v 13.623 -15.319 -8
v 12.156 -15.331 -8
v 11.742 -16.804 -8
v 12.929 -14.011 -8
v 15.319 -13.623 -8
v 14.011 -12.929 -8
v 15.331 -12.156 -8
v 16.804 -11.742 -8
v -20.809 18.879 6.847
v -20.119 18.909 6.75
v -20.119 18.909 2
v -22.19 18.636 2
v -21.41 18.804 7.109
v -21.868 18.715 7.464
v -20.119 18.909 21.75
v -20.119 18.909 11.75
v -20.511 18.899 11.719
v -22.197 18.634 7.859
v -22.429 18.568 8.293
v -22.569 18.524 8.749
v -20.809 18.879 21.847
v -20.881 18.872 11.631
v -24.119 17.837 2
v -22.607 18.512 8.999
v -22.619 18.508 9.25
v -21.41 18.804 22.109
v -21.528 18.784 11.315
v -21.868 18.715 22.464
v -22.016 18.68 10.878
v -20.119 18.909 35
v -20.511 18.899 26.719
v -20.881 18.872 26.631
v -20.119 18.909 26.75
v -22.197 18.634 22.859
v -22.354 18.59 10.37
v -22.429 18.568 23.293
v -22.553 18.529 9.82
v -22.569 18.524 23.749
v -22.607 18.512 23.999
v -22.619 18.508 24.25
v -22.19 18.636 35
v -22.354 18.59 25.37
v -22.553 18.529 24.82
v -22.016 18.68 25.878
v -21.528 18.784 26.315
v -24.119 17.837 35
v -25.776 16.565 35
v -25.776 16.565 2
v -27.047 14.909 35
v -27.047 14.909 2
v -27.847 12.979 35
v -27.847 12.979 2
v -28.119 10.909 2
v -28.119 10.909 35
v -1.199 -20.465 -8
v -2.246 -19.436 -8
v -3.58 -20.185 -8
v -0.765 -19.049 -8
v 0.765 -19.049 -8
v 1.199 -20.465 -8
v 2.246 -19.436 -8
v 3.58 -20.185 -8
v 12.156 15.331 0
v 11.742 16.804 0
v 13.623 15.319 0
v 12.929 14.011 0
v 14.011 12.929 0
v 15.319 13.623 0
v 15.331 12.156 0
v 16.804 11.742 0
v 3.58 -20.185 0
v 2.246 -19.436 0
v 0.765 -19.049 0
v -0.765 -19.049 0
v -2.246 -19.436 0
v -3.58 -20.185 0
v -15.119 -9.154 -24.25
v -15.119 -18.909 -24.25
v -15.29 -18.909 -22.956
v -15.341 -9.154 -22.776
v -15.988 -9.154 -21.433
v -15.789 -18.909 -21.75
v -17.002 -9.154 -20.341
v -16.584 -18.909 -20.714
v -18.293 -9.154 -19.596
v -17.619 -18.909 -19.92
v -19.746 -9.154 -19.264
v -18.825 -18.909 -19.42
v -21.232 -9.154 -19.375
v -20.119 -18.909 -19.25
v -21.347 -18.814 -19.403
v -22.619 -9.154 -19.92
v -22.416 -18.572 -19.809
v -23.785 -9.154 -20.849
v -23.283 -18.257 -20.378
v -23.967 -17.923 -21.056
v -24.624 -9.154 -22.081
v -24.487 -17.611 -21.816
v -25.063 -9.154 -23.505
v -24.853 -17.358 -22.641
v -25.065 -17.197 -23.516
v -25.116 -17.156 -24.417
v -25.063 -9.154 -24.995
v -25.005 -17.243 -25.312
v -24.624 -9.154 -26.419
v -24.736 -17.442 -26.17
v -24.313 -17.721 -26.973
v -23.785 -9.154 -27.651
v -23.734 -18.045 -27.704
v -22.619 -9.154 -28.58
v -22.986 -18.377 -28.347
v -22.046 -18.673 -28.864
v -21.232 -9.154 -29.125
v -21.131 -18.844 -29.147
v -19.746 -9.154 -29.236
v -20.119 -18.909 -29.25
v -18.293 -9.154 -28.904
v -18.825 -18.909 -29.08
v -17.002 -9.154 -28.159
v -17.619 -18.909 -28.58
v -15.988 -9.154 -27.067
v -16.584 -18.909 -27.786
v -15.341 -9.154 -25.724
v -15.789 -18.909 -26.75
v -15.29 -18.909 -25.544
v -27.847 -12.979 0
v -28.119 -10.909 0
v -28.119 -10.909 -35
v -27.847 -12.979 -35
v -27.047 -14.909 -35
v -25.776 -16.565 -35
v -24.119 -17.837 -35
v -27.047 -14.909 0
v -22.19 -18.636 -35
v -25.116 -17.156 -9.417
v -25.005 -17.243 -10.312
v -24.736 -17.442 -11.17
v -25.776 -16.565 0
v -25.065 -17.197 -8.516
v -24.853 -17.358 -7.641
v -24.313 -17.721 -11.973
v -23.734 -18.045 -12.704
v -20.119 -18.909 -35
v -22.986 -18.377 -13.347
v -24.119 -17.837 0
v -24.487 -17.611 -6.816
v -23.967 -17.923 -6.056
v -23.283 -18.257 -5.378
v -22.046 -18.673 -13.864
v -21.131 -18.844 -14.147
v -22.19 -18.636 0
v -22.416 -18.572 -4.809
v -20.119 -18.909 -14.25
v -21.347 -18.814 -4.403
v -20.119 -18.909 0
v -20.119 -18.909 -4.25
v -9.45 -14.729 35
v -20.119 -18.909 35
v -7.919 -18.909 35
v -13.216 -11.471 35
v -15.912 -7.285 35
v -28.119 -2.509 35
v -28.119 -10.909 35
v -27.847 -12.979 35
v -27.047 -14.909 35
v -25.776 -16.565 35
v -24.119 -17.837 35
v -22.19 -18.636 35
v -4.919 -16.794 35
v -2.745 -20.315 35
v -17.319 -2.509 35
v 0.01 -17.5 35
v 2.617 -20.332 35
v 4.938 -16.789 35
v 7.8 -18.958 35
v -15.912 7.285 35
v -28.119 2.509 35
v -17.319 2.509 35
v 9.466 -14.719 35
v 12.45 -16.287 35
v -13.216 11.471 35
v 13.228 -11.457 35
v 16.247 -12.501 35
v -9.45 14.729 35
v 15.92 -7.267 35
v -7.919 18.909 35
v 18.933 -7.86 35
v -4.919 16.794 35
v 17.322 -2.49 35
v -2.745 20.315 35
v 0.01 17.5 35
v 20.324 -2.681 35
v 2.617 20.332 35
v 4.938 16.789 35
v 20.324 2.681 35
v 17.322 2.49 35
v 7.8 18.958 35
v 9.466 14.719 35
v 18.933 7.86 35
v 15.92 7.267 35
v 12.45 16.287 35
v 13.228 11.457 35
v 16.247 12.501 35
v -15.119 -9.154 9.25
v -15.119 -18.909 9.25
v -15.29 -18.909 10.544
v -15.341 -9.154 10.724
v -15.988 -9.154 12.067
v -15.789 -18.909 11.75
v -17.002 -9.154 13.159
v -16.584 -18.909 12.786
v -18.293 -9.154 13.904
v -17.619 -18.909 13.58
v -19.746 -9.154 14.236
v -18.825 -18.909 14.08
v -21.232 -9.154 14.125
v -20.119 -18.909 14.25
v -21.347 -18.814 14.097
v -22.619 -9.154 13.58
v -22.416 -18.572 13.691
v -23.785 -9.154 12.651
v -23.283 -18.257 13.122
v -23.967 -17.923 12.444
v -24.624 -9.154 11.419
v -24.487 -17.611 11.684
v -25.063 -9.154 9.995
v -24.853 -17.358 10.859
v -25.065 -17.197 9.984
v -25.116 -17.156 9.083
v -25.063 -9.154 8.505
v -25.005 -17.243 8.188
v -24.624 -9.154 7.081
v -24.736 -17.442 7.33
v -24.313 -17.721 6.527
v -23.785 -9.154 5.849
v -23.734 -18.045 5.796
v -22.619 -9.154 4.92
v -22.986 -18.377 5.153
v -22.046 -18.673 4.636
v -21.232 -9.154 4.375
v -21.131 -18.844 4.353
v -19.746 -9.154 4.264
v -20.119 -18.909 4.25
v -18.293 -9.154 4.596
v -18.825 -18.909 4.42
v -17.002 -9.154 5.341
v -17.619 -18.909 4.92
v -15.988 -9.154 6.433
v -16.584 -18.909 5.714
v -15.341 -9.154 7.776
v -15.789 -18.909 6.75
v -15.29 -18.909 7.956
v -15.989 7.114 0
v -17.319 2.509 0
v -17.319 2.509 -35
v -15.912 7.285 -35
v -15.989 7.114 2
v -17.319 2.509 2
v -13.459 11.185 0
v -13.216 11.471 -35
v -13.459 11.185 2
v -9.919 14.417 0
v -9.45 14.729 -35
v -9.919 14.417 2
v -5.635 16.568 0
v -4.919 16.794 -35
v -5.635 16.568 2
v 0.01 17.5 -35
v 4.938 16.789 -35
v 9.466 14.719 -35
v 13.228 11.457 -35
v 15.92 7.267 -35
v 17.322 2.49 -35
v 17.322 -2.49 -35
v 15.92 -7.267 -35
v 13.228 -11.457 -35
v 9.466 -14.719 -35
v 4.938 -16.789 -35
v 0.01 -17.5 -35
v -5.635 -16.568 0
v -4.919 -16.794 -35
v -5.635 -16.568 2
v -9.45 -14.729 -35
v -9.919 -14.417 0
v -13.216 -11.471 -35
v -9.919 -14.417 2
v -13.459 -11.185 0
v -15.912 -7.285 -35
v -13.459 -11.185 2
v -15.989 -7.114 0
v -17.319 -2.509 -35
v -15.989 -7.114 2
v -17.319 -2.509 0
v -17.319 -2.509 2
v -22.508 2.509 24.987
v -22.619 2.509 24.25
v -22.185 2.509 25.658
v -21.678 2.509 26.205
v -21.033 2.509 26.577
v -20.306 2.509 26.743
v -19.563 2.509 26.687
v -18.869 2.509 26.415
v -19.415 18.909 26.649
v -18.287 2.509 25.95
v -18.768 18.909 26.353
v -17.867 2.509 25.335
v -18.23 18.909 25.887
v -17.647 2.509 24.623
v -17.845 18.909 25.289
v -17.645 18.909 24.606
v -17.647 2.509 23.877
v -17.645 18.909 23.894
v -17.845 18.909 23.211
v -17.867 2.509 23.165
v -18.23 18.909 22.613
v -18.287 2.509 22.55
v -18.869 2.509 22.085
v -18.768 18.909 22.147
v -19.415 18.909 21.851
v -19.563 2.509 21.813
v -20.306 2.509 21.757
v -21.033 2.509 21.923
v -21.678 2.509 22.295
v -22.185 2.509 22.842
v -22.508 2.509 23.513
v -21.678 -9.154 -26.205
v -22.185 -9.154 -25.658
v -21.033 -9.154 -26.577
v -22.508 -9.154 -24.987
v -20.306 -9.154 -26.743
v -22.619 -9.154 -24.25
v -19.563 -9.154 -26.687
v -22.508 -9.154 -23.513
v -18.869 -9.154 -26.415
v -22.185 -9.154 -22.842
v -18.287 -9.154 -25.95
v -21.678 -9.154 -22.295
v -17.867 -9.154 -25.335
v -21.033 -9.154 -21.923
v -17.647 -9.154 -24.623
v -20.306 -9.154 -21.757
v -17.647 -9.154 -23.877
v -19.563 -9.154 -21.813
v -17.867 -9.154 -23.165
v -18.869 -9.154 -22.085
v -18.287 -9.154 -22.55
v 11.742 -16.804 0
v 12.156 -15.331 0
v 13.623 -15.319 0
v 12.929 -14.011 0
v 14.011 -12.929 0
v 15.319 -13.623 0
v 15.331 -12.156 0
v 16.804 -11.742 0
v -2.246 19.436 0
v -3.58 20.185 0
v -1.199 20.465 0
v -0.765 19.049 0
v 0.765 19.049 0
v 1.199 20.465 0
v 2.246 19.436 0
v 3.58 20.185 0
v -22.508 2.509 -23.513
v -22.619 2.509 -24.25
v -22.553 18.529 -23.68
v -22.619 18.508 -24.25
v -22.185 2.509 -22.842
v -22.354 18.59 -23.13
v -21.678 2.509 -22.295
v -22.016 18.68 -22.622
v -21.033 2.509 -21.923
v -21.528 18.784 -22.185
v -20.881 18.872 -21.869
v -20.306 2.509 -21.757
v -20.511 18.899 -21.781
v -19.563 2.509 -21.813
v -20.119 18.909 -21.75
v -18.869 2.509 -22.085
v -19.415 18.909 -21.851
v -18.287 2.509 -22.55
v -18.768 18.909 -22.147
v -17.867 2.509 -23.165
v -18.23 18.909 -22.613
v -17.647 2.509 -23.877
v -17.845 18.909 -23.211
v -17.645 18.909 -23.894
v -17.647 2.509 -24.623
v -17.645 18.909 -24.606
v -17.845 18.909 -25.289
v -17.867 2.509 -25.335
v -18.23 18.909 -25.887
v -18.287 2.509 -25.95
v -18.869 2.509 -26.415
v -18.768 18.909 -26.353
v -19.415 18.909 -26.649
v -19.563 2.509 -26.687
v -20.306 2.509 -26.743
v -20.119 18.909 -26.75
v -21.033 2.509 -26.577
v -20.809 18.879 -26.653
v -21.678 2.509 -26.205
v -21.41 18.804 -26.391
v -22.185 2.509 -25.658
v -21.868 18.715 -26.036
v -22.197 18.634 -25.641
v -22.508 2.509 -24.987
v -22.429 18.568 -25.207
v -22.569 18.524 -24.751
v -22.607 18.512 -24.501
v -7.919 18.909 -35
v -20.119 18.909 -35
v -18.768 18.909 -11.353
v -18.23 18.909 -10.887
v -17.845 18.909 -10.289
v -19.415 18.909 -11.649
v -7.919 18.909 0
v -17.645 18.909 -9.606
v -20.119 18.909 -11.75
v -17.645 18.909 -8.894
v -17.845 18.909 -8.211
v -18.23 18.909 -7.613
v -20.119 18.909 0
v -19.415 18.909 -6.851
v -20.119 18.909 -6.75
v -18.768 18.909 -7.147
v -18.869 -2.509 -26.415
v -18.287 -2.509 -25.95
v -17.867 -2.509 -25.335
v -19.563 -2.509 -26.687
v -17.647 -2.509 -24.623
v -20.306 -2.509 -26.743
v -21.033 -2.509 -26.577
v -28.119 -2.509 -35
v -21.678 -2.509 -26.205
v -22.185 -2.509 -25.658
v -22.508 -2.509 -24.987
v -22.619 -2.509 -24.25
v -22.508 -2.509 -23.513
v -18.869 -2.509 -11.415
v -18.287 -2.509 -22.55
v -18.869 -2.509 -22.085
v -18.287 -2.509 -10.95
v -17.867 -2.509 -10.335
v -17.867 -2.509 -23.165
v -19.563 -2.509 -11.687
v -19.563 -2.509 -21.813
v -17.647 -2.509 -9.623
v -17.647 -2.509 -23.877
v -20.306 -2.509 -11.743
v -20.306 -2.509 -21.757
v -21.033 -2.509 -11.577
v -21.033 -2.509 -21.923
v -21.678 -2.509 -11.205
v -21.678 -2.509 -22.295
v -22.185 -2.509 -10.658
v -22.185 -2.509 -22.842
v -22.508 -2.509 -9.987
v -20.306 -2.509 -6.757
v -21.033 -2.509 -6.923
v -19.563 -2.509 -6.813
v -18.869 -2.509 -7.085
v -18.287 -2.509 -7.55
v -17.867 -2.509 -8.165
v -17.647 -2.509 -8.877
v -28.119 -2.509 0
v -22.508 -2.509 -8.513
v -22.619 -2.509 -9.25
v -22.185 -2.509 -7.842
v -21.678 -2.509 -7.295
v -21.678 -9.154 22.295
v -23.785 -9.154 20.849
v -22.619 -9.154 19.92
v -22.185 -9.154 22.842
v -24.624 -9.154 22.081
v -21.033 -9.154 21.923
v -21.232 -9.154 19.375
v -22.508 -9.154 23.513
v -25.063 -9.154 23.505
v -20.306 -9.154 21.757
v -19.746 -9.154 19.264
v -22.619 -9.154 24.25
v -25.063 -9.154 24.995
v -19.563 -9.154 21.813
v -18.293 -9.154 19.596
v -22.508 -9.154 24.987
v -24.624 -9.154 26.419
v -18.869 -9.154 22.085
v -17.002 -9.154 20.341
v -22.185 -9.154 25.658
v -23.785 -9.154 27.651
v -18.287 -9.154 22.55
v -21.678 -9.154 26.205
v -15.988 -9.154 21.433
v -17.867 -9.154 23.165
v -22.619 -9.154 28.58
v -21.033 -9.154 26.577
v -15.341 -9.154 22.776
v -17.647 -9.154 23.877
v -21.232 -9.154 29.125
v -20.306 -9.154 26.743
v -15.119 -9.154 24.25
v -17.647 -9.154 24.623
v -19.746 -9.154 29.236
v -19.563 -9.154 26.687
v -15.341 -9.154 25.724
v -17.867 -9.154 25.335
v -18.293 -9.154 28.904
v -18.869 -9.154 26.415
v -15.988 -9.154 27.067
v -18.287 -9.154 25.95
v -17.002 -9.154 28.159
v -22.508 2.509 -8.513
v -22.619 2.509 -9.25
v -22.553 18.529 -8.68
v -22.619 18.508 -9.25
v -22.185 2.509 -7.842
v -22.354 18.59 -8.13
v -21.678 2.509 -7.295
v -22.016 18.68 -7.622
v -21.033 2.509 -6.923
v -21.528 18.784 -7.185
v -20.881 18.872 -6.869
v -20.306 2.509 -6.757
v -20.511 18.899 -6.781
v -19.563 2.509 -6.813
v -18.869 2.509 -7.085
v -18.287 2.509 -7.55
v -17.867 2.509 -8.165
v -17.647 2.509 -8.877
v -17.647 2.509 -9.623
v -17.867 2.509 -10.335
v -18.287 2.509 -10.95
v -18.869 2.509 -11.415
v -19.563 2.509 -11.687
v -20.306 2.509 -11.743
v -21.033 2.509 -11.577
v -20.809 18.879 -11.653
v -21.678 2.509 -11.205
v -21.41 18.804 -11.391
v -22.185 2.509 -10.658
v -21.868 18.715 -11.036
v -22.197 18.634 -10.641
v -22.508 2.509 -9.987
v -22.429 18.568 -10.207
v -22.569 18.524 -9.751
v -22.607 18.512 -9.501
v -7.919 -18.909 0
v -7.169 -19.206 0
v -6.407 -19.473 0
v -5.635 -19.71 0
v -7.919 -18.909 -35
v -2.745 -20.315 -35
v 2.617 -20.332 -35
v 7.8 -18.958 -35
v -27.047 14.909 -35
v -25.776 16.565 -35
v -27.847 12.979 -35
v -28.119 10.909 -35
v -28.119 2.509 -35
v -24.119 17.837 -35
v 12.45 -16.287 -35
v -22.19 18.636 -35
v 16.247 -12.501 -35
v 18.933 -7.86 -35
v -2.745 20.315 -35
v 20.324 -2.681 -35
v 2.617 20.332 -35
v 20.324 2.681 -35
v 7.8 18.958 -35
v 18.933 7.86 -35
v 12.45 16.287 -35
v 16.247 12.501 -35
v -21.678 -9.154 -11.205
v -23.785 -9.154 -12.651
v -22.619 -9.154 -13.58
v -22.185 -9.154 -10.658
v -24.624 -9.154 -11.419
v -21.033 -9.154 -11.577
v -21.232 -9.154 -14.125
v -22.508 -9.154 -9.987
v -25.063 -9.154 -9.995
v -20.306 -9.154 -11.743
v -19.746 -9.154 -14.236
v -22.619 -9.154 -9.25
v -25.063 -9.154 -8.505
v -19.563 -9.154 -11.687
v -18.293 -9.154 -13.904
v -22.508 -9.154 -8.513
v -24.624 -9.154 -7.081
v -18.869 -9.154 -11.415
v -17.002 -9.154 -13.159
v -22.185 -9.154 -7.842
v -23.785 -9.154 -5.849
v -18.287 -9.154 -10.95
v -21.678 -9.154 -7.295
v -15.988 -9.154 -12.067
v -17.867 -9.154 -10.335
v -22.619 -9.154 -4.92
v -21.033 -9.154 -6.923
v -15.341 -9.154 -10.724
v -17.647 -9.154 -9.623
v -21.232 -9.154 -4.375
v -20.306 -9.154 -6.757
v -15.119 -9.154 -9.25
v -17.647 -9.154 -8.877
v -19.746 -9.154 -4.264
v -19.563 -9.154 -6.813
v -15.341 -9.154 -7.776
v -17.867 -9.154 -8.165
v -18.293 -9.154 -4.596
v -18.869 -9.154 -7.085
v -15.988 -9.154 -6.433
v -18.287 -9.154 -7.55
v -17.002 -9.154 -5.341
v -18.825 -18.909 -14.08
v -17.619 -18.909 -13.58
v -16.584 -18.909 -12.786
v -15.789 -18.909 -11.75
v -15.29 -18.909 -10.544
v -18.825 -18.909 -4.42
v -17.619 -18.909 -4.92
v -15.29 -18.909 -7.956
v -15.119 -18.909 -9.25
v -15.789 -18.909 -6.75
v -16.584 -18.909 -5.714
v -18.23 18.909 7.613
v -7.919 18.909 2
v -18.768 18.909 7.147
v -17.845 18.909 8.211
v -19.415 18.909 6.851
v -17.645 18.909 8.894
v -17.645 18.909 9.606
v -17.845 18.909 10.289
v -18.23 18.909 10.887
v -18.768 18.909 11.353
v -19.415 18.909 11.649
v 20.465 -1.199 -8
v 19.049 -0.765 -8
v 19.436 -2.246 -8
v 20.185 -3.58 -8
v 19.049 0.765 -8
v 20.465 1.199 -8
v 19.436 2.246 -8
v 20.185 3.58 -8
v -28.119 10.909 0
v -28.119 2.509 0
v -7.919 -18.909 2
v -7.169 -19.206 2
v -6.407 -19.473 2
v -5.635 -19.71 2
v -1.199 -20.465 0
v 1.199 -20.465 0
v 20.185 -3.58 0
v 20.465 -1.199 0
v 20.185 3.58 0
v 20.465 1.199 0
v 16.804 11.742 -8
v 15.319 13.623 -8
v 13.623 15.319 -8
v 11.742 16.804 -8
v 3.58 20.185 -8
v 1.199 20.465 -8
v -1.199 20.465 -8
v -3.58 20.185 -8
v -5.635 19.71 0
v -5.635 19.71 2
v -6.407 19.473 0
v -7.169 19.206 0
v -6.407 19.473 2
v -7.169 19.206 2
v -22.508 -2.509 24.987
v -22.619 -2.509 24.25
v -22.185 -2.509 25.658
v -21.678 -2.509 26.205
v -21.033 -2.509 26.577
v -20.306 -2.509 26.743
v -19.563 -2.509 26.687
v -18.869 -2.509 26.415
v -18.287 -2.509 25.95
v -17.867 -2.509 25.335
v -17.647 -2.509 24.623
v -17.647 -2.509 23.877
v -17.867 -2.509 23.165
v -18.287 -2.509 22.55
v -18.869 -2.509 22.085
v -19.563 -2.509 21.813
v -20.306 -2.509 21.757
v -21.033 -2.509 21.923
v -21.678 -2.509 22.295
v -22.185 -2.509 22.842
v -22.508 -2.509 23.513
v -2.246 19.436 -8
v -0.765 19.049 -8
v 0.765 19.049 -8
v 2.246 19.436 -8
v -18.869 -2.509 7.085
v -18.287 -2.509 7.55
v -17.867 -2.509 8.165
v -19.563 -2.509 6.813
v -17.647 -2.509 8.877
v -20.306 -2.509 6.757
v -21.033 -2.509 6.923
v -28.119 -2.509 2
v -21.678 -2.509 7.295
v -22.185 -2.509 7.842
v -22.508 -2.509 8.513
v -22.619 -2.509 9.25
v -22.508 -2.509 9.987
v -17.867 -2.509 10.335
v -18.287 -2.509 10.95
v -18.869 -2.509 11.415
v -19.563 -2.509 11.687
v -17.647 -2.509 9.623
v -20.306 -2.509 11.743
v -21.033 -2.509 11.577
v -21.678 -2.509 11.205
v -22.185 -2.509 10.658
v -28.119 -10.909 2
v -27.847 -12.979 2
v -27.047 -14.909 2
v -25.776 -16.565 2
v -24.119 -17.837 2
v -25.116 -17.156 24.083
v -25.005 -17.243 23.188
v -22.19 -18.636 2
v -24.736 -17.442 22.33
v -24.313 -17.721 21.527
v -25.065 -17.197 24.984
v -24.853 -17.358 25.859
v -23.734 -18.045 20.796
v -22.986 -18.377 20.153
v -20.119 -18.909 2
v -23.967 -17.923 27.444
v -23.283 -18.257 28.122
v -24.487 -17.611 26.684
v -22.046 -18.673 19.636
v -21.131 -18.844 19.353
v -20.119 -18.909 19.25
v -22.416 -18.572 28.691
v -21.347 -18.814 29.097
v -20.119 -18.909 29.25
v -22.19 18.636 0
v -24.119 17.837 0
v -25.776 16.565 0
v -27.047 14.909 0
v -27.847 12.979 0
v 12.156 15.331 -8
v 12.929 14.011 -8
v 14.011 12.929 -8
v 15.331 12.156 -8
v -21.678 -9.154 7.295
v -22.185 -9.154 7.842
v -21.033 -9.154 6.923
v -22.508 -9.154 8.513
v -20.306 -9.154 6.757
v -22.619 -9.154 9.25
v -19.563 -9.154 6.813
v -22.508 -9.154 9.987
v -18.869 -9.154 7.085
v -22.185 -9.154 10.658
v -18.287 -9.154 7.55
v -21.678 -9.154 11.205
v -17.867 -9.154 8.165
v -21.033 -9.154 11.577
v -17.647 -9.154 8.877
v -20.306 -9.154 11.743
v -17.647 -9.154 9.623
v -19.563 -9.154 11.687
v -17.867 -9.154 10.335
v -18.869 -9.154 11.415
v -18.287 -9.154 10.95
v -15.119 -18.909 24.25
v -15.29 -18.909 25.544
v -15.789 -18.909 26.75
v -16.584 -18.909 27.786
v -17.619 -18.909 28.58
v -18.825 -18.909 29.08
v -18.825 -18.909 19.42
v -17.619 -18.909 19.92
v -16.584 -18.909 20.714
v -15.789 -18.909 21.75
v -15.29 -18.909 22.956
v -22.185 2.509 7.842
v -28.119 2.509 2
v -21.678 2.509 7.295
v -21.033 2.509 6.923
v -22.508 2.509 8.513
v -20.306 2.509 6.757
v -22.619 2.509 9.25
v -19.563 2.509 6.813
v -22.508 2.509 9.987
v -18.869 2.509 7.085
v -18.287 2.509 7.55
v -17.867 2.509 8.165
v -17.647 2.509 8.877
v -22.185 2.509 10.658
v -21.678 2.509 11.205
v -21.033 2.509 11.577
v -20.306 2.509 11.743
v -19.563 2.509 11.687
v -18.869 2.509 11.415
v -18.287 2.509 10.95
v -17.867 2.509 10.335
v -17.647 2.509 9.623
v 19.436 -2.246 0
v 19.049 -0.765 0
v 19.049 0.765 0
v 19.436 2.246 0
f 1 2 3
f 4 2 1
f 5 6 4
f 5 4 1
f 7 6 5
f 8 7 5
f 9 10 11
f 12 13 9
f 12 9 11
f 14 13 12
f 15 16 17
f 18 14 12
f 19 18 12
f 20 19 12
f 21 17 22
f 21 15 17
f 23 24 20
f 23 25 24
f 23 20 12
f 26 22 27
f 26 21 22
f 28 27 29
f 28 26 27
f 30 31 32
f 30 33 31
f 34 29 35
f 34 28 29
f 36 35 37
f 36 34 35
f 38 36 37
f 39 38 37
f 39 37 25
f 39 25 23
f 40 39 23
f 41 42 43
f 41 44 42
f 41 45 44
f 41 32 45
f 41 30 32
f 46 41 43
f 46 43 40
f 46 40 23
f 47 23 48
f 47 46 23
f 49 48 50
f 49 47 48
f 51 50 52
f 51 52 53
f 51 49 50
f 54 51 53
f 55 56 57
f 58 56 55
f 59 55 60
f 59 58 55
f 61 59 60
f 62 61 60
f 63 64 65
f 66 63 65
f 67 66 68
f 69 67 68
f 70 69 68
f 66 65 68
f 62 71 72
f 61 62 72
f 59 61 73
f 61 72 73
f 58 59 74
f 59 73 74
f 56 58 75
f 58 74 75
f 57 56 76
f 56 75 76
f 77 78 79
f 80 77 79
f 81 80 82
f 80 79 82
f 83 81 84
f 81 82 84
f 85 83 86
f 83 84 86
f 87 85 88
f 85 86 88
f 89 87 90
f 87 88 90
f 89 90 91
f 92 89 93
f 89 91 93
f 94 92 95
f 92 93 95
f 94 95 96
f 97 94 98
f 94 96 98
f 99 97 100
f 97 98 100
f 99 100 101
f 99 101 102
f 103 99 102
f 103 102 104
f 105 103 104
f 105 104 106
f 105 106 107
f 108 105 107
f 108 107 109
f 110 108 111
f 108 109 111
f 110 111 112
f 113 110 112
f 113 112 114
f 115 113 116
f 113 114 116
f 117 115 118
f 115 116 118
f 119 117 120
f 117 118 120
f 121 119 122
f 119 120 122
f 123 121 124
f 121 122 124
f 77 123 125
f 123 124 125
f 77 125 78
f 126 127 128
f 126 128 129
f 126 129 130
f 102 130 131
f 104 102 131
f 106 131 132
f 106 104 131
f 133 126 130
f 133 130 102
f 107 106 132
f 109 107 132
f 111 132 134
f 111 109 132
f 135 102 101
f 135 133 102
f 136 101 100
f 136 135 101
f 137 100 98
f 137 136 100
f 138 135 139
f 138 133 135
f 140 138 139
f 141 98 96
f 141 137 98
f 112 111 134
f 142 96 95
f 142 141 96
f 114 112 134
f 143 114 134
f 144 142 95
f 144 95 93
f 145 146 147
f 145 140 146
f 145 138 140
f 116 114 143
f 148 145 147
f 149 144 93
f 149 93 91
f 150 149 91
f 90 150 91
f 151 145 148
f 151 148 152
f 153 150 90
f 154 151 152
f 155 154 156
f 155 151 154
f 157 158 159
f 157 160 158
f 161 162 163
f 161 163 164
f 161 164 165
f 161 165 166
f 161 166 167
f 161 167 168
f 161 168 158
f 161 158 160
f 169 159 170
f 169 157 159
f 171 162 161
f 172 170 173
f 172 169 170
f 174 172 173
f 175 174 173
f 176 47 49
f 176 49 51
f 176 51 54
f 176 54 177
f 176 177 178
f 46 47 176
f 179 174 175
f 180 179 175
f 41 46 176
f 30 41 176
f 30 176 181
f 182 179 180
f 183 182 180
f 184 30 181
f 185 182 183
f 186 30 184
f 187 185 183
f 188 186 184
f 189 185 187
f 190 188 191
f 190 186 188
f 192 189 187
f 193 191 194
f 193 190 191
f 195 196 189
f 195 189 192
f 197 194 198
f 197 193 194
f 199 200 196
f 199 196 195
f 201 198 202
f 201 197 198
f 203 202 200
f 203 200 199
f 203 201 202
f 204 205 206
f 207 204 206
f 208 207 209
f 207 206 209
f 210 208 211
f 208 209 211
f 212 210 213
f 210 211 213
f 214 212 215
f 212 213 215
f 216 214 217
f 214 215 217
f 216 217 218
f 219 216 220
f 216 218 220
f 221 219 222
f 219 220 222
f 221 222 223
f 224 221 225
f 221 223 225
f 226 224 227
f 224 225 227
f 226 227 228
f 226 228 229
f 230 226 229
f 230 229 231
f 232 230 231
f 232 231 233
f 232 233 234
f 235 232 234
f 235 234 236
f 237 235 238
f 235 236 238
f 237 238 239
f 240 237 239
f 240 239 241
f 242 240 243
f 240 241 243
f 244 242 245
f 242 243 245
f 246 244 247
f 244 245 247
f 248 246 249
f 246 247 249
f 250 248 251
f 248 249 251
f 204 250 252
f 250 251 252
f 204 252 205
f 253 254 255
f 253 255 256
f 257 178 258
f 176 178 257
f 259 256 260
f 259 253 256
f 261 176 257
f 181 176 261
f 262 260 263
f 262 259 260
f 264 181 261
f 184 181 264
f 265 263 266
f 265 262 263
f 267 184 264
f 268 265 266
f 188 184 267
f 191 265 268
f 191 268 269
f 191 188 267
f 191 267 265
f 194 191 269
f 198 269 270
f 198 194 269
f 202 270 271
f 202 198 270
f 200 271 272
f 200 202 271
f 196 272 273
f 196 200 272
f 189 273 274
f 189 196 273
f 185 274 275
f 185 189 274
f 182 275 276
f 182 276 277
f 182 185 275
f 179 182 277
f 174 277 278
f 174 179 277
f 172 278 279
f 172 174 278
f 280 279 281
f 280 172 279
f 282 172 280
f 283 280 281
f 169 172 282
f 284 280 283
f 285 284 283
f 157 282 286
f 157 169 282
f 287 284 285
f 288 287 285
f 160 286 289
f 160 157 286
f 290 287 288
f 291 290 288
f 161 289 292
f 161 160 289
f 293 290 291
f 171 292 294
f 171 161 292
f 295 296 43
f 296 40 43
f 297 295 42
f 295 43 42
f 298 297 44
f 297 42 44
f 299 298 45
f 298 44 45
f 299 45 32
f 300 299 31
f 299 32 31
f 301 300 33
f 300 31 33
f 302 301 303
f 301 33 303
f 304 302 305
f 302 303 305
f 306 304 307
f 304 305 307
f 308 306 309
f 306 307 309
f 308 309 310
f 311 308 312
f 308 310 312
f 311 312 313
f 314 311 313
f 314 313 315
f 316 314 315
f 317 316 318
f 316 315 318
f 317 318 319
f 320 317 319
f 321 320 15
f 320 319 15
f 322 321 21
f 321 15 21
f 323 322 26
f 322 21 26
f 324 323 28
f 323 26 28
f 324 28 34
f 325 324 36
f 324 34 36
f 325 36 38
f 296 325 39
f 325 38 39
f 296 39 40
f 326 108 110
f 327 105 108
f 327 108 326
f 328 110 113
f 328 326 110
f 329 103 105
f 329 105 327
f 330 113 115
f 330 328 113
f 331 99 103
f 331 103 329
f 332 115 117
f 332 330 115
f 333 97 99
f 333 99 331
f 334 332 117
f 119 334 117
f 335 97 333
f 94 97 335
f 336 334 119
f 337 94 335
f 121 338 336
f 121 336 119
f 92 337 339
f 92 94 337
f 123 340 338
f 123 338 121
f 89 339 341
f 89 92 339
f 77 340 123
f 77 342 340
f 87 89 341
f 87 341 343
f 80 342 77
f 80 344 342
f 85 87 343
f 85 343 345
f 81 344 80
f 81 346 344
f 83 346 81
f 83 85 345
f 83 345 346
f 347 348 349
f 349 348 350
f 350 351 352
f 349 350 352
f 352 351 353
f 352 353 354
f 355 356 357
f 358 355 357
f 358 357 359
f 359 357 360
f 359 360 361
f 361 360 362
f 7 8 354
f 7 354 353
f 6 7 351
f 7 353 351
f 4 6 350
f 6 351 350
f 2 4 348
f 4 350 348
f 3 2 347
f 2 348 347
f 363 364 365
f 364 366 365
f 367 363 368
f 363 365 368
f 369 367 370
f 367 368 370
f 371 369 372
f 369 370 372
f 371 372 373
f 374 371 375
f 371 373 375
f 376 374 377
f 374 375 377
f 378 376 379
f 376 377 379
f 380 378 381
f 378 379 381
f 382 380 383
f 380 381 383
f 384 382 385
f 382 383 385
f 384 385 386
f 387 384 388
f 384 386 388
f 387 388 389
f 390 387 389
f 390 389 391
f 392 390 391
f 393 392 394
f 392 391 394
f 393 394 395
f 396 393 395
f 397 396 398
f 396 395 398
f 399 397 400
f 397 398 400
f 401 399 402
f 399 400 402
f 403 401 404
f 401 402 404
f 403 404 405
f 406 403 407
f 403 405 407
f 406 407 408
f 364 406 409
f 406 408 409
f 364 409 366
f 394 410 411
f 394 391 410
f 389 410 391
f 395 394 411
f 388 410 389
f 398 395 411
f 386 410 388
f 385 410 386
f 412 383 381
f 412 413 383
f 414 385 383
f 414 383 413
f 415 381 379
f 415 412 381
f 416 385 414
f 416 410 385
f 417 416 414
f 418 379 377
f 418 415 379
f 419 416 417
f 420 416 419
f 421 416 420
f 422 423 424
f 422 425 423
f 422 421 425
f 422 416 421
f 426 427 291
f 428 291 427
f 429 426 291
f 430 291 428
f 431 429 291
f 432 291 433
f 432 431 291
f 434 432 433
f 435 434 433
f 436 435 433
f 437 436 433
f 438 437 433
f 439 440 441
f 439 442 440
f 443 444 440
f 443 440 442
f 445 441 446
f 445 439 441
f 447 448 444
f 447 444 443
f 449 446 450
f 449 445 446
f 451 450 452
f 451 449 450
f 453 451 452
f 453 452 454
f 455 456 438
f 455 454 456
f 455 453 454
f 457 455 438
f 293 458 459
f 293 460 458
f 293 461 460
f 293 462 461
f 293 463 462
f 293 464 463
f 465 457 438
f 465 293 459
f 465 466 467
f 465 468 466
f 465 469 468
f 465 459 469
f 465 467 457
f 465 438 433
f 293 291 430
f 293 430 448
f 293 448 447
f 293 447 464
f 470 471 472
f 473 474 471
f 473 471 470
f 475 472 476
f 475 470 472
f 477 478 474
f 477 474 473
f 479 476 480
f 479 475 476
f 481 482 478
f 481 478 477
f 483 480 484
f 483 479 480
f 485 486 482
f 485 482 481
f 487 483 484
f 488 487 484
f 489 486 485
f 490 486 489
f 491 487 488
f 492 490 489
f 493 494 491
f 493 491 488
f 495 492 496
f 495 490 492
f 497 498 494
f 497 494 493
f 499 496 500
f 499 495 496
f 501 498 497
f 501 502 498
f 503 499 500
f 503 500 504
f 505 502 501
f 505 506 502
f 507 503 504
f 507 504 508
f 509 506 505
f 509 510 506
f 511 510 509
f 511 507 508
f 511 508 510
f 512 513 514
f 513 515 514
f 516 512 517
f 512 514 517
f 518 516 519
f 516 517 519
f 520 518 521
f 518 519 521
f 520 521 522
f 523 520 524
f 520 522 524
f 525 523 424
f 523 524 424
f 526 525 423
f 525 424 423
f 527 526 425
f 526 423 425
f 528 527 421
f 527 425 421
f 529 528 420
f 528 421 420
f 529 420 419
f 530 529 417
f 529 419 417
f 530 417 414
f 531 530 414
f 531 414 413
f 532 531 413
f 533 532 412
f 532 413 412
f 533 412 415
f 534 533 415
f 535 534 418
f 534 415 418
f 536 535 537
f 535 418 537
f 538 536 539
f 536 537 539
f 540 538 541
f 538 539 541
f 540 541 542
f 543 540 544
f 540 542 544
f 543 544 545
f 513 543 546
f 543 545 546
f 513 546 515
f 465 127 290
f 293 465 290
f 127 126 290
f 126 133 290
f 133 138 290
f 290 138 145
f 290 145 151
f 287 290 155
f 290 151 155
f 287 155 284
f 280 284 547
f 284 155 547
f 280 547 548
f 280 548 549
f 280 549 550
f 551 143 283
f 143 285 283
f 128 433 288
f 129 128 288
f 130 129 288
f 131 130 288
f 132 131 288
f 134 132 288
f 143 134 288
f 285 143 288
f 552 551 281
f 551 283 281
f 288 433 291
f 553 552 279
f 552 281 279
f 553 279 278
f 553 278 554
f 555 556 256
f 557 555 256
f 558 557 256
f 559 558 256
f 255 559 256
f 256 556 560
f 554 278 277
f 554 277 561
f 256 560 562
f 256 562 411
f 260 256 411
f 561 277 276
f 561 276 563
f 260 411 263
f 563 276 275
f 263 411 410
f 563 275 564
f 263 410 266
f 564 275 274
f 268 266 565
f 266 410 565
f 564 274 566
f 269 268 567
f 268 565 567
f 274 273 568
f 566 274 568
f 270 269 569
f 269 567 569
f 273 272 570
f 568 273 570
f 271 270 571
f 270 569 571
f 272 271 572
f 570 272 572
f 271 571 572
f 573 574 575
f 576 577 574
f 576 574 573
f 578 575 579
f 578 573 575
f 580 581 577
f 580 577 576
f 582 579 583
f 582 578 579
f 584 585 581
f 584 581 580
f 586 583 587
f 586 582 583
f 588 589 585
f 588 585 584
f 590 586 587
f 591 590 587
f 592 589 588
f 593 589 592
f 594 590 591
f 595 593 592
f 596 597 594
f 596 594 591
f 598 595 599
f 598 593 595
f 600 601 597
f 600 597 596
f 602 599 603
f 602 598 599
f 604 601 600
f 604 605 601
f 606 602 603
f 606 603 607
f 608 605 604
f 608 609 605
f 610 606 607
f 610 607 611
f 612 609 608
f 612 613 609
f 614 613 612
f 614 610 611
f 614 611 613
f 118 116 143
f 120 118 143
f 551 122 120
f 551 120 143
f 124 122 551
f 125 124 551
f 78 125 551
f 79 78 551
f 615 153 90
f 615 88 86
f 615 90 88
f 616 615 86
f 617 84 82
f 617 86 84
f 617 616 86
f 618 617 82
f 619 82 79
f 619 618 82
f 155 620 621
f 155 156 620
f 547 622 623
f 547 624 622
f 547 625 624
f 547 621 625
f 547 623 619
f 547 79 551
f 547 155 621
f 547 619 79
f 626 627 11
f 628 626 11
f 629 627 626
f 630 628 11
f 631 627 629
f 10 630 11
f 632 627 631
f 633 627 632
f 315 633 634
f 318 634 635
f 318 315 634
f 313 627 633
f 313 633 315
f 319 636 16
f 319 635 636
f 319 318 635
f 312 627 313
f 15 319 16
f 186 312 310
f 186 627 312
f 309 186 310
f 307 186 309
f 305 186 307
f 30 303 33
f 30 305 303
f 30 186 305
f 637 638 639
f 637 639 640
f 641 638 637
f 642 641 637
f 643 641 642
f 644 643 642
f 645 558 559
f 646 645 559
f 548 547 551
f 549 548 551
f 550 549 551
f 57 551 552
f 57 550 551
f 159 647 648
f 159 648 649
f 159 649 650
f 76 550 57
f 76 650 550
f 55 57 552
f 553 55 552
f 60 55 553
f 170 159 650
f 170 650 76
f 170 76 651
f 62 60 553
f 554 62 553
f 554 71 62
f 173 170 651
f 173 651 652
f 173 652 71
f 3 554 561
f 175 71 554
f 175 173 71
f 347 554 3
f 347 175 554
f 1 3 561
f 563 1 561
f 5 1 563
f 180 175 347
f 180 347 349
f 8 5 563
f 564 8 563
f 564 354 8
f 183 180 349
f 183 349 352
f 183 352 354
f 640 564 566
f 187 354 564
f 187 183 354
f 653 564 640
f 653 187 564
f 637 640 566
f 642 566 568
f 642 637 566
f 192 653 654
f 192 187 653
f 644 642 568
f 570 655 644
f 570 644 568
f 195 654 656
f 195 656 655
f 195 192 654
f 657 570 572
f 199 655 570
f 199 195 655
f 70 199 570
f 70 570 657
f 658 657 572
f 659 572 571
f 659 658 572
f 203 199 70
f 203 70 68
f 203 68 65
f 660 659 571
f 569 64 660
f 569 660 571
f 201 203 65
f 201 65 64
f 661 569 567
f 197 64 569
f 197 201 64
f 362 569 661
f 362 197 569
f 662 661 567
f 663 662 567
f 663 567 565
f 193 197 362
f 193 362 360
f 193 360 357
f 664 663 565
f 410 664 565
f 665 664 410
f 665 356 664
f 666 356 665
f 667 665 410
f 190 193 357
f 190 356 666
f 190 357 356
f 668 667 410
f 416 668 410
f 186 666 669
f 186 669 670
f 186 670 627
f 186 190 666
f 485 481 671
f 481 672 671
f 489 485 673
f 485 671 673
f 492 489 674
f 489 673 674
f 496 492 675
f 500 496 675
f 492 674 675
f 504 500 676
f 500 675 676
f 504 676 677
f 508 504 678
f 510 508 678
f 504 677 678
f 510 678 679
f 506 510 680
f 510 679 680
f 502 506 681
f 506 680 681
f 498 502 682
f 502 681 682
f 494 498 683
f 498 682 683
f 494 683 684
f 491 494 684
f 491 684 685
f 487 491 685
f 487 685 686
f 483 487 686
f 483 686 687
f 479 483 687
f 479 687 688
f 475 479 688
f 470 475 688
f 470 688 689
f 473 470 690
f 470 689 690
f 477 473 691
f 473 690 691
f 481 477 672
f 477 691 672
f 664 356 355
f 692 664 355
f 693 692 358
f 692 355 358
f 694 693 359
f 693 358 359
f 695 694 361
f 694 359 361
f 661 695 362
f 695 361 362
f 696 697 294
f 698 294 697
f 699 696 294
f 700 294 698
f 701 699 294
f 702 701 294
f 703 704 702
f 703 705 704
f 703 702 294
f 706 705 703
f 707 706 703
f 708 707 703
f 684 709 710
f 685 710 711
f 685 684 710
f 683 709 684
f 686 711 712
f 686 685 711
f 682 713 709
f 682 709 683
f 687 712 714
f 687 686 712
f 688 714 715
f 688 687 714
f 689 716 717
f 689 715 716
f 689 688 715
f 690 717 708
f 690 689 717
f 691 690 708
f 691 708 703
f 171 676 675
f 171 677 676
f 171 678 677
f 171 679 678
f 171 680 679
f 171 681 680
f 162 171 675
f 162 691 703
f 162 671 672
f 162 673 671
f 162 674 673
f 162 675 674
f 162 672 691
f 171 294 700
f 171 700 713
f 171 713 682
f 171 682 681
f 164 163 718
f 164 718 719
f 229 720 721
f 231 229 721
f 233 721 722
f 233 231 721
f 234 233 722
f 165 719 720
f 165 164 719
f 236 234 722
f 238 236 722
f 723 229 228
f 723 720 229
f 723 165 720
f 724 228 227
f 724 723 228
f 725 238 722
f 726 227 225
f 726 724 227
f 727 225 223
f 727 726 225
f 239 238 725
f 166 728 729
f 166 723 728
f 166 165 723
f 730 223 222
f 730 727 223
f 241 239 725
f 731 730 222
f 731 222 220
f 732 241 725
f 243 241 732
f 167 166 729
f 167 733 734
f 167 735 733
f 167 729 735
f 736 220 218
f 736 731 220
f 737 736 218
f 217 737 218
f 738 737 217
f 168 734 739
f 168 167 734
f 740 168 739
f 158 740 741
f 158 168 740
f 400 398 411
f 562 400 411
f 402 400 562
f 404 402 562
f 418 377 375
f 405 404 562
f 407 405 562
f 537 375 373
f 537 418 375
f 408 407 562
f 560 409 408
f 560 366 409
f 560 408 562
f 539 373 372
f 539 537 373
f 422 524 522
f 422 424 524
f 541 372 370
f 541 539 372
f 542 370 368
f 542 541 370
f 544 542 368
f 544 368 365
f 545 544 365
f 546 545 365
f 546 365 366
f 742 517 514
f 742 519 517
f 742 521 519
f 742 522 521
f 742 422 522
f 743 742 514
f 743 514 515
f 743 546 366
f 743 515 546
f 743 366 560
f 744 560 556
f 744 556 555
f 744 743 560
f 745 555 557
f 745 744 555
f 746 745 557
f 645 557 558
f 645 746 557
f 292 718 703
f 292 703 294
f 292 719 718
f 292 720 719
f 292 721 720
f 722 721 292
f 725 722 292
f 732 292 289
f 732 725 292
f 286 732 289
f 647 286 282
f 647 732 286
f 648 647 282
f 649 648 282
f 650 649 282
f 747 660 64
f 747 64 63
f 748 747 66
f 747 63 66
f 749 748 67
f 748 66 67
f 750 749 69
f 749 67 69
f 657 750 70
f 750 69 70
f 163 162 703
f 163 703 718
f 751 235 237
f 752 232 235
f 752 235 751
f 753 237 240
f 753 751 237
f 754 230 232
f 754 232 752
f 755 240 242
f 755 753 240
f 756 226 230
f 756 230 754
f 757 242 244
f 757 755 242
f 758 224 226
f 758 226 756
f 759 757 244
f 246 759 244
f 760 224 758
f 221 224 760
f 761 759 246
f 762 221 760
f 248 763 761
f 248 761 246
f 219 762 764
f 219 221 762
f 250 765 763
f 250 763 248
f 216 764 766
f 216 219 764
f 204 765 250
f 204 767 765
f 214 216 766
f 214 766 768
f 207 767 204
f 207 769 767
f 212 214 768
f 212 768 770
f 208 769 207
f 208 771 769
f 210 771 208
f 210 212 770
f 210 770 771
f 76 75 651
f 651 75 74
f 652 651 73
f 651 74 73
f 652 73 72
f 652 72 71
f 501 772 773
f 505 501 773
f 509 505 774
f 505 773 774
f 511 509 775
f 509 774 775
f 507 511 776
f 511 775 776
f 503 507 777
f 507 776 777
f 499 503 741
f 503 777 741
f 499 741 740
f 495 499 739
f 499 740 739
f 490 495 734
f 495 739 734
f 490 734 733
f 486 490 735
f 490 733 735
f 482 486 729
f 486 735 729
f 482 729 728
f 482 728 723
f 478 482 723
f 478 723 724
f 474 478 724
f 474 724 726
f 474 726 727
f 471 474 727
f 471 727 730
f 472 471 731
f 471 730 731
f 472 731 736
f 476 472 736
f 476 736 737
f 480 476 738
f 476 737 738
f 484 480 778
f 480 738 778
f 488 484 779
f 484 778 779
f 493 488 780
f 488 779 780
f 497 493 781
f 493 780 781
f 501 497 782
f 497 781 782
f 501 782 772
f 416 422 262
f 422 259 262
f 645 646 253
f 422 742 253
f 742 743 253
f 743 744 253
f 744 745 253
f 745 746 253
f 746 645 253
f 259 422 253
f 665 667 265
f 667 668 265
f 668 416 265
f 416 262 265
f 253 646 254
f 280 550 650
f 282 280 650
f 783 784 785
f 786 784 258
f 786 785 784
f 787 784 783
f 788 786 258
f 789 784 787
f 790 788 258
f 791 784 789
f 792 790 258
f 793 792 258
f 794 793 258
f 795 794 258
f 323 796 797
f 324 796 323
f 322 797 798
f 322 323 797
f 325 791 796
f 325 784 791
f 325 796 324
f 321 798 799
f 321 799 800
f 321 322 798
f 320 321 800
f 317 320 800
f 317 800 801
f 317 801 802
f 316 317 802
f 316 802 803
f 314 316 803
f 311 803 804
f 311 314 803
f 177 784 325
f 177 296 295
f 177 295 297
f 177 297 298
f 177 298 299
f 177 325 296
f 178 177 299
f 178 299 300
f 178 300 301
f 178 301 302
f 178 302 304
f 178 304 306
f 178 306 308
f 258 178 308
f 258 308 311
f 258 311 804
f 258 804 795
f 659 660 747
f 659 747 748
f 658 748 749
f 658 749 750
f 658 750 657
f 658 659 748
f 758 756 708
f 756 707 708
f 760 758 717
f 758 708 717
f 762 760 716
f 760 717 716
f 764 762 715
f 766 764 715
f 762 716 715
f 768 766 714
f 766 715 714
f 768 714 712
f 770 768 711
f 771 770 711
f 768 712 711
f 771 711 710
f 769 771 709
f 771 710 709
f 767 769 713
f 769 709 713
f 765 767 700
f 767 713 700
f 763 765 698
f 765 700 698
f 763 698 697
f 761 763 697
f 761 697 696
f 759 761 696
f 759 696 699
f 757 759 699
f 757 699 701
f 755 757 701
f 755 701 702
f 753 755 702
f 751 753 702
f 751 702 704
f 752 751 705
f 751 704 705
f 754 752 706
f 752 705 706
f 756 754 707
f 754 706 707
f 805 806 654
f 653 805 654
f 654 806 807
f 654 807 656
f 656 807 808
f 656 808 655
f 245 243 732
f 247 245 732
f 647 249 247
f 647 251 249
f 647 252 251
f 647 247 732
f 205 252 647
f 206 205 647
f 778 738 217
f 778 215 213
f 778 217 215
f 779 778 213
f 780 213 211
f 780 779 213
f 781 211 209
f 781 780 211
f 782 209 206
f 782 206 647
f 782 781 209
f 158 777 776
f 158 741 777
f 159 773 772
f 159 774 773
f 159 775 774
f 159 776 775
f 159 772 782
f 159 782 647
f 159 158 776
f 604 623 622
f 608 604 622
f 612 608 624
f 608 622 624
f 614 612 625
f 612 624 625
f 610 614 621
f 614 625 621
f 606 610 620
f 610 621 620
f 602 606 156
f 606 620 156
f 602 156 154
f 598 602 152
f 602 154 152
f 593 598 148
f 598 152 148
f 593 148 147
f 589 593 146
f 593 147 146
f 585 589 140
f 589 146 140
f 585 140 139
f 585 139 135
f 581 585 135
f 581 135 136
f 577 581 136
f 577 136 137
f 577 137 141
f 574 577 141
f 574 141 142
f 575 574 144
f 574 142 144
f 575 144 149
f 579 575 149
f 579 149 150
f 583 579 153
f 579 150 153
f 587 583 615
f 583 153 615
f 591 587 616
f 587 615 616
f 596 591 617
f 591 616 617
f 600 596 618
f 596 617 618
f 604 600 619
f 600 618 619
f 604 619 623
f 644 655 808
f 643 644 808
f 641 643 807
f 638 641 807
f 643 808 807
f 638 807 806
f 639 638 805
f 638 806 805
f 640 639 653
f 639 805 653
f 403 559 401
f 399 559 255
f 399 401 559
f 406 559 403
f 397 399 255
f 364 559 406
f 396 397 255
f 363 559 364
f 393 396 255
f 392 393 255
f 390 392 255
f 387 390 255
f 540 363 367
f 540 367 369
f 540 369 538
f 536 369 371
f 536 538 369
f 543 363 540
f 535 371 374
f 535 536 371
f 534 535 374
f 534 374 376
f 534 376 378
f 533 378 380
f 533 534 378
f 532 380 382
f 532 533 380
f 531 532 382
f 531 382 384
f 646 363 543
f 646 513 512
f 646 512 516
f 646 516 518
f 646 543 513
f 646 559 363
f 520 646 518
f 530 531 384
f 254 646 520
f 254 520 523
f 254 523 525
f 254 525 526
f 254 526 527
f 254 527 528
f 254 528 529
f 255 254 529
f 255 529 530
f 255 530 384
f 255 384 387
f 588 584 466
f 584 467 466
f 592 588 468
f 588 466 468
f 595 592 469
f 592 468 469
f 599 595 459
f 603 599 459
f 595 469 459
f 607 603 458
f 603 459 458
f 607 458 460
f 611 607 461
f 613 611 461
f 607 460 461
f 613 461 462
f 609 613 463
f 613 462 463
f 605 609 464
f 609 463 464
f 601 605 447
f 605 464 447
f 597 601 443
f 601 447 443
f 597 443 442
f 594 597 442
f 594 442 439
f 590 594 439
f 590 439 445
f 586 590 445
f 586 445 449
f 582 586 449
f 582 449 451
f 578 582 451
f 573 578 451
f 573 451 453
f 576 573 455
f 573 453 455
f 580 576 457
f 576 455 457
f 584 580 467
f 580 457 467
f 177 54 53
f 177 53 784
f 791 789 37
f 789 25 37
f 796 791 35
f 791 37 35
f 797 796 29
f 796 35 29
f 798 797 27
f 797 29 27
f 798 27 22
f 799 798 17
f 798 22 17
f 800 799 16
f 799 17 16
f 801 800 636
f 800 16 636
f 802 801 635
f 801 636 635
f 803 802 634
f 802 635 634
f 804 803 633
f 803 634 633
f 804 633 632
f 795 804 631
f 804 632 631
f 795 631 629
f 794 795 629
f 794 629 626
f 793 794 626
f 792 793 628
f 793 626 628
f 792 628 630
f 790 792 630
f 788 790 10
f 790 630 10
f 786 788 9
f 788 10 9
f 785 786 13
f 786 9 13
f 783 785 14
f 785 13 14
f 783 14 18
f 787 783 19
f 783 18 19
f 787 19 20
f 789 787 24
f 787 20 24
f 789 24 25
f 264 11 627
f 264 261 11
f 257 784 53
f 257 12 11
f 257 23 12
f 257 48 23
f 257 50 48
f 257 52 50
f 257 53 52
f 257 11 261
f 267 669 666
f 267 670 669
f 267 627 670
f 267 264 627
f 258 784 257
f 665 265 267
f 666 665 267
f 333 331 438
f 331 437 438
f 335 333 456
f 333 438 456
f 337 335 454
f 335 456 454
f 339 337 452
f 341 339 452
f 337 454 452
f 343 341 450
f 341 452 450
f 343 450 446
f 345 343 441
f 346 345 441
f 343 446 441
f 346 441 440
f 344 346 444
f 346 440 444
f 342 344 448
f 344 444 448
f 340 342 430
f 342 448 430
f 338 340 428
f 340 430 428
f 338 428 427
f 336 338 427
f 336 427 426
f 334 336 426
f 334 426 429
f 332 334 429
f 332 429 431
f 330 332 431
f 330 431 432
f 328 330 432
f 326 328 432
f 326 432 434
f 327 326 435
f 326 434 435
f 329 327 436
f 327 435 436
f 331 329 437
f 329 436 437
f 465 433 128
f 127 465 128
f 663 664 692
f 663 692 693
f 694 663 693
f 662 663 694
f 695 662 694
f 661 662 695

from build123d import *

# Parameters (mm, degrees)
F1_DEPTH       = 35
F3_D           = 5
F3_START       = 1.7550021
F3_CBORE_D     = 10
F3_CBORE_DEPTH = 8
F4_W           = 22.4840755326
F4_H           = 2
F5_DEPTH       = 25
F6_R           = 6
F7_DEPTH       = 8


with BuildPart() as f1:
    # F0 (on Top) → F1 (new body, symmetric)
    with BuildSketch(Plane.XY):
        with BuildLine():
            Line((-20.1192642082, -18.9086026559), (-7.9192642082, -18.9086026559))
            ThreePointArc((-7.9192642082, -18.9086026559), (20.5, 0), (-7.9192642082, 18.9086026559))
            Line((-7.9192642082, 18.9086026559), (-20.1192642082, 18.9086026559))
            ThreePointArc((-20.1192642082, 18.9086026559), (-25.7761184577, 16.5654569054), (-28.1192642082, 10.9086026559))
            Line((-28.1192642082, 10.9086026559), (-28.1192642082, 2.5086026559))
            Line((-28.1192642082, 2.5086026559), (-17.3192642082, 2.5086026559))
            ThreePointArc((-17.3192642082, 2.5086026559), (17.5, 0), (-17.3192642082, -2.5086026559))
            Line((-17.3192642082, -2.5086026559), (-28.1192642082, -2.5086026559))
            Line((-28.1192642082, -2.5086026559), (-28.1192642082, -10.9086026559))
            ThreePointArc((-28.1192642082, -10.9086026559), (-25.7761184577, -16.5654569054), (-20.1192642082, -18.9086026559))
        make_face()
    extrude(amount=F1_DEPTH, both=True)

    # F3 (through all)
    # its depths count from where the whole tool has entered the part; down to there all is cleared
    with Locations(Plane.XZ.offset(18.9086026559).offset(-F3_START)):
        with Locations((-20.1192642082, -24.25), (-20.1192642082, -9.25), (-20.1192642082, 9.25), (-20.1192642082, 24.25)):
            CounterBoreHole(F3_D / 2, F3_CBORE_D / 2, F3_CBORE_DEPTH)

    # F4 (on Front) → F5 (cut, symmetric)
    with BuildSketch(Plane.XZ):
        with Locations((-16.8772264419, 1)):
            Rectangle(F4_W, F4_H)
    extrude(amount=F5_DEPTH, both=True, mode=Mode.SUBTRACT)

    # F6 (on Top) → F7 (cut)
    with BuildSketch(Plane.XY):
        with Locations((0, -25)):
            Circle(F6_R)
        with Locations((17.6776695297, -17.6776695297)):
            Circle(F6_R)
        with Locations((25, 0)):
            Circle(F6_R)
        with Locations((17.6776695297, 17.6776695297)):
            Circle(F6_R)
        with Locations((0, 25)):
            Circle(F6_R)
    extrude(amount=-F7_DEPTH, mode=Mode.SUBTRACT)


solid = f1.part
